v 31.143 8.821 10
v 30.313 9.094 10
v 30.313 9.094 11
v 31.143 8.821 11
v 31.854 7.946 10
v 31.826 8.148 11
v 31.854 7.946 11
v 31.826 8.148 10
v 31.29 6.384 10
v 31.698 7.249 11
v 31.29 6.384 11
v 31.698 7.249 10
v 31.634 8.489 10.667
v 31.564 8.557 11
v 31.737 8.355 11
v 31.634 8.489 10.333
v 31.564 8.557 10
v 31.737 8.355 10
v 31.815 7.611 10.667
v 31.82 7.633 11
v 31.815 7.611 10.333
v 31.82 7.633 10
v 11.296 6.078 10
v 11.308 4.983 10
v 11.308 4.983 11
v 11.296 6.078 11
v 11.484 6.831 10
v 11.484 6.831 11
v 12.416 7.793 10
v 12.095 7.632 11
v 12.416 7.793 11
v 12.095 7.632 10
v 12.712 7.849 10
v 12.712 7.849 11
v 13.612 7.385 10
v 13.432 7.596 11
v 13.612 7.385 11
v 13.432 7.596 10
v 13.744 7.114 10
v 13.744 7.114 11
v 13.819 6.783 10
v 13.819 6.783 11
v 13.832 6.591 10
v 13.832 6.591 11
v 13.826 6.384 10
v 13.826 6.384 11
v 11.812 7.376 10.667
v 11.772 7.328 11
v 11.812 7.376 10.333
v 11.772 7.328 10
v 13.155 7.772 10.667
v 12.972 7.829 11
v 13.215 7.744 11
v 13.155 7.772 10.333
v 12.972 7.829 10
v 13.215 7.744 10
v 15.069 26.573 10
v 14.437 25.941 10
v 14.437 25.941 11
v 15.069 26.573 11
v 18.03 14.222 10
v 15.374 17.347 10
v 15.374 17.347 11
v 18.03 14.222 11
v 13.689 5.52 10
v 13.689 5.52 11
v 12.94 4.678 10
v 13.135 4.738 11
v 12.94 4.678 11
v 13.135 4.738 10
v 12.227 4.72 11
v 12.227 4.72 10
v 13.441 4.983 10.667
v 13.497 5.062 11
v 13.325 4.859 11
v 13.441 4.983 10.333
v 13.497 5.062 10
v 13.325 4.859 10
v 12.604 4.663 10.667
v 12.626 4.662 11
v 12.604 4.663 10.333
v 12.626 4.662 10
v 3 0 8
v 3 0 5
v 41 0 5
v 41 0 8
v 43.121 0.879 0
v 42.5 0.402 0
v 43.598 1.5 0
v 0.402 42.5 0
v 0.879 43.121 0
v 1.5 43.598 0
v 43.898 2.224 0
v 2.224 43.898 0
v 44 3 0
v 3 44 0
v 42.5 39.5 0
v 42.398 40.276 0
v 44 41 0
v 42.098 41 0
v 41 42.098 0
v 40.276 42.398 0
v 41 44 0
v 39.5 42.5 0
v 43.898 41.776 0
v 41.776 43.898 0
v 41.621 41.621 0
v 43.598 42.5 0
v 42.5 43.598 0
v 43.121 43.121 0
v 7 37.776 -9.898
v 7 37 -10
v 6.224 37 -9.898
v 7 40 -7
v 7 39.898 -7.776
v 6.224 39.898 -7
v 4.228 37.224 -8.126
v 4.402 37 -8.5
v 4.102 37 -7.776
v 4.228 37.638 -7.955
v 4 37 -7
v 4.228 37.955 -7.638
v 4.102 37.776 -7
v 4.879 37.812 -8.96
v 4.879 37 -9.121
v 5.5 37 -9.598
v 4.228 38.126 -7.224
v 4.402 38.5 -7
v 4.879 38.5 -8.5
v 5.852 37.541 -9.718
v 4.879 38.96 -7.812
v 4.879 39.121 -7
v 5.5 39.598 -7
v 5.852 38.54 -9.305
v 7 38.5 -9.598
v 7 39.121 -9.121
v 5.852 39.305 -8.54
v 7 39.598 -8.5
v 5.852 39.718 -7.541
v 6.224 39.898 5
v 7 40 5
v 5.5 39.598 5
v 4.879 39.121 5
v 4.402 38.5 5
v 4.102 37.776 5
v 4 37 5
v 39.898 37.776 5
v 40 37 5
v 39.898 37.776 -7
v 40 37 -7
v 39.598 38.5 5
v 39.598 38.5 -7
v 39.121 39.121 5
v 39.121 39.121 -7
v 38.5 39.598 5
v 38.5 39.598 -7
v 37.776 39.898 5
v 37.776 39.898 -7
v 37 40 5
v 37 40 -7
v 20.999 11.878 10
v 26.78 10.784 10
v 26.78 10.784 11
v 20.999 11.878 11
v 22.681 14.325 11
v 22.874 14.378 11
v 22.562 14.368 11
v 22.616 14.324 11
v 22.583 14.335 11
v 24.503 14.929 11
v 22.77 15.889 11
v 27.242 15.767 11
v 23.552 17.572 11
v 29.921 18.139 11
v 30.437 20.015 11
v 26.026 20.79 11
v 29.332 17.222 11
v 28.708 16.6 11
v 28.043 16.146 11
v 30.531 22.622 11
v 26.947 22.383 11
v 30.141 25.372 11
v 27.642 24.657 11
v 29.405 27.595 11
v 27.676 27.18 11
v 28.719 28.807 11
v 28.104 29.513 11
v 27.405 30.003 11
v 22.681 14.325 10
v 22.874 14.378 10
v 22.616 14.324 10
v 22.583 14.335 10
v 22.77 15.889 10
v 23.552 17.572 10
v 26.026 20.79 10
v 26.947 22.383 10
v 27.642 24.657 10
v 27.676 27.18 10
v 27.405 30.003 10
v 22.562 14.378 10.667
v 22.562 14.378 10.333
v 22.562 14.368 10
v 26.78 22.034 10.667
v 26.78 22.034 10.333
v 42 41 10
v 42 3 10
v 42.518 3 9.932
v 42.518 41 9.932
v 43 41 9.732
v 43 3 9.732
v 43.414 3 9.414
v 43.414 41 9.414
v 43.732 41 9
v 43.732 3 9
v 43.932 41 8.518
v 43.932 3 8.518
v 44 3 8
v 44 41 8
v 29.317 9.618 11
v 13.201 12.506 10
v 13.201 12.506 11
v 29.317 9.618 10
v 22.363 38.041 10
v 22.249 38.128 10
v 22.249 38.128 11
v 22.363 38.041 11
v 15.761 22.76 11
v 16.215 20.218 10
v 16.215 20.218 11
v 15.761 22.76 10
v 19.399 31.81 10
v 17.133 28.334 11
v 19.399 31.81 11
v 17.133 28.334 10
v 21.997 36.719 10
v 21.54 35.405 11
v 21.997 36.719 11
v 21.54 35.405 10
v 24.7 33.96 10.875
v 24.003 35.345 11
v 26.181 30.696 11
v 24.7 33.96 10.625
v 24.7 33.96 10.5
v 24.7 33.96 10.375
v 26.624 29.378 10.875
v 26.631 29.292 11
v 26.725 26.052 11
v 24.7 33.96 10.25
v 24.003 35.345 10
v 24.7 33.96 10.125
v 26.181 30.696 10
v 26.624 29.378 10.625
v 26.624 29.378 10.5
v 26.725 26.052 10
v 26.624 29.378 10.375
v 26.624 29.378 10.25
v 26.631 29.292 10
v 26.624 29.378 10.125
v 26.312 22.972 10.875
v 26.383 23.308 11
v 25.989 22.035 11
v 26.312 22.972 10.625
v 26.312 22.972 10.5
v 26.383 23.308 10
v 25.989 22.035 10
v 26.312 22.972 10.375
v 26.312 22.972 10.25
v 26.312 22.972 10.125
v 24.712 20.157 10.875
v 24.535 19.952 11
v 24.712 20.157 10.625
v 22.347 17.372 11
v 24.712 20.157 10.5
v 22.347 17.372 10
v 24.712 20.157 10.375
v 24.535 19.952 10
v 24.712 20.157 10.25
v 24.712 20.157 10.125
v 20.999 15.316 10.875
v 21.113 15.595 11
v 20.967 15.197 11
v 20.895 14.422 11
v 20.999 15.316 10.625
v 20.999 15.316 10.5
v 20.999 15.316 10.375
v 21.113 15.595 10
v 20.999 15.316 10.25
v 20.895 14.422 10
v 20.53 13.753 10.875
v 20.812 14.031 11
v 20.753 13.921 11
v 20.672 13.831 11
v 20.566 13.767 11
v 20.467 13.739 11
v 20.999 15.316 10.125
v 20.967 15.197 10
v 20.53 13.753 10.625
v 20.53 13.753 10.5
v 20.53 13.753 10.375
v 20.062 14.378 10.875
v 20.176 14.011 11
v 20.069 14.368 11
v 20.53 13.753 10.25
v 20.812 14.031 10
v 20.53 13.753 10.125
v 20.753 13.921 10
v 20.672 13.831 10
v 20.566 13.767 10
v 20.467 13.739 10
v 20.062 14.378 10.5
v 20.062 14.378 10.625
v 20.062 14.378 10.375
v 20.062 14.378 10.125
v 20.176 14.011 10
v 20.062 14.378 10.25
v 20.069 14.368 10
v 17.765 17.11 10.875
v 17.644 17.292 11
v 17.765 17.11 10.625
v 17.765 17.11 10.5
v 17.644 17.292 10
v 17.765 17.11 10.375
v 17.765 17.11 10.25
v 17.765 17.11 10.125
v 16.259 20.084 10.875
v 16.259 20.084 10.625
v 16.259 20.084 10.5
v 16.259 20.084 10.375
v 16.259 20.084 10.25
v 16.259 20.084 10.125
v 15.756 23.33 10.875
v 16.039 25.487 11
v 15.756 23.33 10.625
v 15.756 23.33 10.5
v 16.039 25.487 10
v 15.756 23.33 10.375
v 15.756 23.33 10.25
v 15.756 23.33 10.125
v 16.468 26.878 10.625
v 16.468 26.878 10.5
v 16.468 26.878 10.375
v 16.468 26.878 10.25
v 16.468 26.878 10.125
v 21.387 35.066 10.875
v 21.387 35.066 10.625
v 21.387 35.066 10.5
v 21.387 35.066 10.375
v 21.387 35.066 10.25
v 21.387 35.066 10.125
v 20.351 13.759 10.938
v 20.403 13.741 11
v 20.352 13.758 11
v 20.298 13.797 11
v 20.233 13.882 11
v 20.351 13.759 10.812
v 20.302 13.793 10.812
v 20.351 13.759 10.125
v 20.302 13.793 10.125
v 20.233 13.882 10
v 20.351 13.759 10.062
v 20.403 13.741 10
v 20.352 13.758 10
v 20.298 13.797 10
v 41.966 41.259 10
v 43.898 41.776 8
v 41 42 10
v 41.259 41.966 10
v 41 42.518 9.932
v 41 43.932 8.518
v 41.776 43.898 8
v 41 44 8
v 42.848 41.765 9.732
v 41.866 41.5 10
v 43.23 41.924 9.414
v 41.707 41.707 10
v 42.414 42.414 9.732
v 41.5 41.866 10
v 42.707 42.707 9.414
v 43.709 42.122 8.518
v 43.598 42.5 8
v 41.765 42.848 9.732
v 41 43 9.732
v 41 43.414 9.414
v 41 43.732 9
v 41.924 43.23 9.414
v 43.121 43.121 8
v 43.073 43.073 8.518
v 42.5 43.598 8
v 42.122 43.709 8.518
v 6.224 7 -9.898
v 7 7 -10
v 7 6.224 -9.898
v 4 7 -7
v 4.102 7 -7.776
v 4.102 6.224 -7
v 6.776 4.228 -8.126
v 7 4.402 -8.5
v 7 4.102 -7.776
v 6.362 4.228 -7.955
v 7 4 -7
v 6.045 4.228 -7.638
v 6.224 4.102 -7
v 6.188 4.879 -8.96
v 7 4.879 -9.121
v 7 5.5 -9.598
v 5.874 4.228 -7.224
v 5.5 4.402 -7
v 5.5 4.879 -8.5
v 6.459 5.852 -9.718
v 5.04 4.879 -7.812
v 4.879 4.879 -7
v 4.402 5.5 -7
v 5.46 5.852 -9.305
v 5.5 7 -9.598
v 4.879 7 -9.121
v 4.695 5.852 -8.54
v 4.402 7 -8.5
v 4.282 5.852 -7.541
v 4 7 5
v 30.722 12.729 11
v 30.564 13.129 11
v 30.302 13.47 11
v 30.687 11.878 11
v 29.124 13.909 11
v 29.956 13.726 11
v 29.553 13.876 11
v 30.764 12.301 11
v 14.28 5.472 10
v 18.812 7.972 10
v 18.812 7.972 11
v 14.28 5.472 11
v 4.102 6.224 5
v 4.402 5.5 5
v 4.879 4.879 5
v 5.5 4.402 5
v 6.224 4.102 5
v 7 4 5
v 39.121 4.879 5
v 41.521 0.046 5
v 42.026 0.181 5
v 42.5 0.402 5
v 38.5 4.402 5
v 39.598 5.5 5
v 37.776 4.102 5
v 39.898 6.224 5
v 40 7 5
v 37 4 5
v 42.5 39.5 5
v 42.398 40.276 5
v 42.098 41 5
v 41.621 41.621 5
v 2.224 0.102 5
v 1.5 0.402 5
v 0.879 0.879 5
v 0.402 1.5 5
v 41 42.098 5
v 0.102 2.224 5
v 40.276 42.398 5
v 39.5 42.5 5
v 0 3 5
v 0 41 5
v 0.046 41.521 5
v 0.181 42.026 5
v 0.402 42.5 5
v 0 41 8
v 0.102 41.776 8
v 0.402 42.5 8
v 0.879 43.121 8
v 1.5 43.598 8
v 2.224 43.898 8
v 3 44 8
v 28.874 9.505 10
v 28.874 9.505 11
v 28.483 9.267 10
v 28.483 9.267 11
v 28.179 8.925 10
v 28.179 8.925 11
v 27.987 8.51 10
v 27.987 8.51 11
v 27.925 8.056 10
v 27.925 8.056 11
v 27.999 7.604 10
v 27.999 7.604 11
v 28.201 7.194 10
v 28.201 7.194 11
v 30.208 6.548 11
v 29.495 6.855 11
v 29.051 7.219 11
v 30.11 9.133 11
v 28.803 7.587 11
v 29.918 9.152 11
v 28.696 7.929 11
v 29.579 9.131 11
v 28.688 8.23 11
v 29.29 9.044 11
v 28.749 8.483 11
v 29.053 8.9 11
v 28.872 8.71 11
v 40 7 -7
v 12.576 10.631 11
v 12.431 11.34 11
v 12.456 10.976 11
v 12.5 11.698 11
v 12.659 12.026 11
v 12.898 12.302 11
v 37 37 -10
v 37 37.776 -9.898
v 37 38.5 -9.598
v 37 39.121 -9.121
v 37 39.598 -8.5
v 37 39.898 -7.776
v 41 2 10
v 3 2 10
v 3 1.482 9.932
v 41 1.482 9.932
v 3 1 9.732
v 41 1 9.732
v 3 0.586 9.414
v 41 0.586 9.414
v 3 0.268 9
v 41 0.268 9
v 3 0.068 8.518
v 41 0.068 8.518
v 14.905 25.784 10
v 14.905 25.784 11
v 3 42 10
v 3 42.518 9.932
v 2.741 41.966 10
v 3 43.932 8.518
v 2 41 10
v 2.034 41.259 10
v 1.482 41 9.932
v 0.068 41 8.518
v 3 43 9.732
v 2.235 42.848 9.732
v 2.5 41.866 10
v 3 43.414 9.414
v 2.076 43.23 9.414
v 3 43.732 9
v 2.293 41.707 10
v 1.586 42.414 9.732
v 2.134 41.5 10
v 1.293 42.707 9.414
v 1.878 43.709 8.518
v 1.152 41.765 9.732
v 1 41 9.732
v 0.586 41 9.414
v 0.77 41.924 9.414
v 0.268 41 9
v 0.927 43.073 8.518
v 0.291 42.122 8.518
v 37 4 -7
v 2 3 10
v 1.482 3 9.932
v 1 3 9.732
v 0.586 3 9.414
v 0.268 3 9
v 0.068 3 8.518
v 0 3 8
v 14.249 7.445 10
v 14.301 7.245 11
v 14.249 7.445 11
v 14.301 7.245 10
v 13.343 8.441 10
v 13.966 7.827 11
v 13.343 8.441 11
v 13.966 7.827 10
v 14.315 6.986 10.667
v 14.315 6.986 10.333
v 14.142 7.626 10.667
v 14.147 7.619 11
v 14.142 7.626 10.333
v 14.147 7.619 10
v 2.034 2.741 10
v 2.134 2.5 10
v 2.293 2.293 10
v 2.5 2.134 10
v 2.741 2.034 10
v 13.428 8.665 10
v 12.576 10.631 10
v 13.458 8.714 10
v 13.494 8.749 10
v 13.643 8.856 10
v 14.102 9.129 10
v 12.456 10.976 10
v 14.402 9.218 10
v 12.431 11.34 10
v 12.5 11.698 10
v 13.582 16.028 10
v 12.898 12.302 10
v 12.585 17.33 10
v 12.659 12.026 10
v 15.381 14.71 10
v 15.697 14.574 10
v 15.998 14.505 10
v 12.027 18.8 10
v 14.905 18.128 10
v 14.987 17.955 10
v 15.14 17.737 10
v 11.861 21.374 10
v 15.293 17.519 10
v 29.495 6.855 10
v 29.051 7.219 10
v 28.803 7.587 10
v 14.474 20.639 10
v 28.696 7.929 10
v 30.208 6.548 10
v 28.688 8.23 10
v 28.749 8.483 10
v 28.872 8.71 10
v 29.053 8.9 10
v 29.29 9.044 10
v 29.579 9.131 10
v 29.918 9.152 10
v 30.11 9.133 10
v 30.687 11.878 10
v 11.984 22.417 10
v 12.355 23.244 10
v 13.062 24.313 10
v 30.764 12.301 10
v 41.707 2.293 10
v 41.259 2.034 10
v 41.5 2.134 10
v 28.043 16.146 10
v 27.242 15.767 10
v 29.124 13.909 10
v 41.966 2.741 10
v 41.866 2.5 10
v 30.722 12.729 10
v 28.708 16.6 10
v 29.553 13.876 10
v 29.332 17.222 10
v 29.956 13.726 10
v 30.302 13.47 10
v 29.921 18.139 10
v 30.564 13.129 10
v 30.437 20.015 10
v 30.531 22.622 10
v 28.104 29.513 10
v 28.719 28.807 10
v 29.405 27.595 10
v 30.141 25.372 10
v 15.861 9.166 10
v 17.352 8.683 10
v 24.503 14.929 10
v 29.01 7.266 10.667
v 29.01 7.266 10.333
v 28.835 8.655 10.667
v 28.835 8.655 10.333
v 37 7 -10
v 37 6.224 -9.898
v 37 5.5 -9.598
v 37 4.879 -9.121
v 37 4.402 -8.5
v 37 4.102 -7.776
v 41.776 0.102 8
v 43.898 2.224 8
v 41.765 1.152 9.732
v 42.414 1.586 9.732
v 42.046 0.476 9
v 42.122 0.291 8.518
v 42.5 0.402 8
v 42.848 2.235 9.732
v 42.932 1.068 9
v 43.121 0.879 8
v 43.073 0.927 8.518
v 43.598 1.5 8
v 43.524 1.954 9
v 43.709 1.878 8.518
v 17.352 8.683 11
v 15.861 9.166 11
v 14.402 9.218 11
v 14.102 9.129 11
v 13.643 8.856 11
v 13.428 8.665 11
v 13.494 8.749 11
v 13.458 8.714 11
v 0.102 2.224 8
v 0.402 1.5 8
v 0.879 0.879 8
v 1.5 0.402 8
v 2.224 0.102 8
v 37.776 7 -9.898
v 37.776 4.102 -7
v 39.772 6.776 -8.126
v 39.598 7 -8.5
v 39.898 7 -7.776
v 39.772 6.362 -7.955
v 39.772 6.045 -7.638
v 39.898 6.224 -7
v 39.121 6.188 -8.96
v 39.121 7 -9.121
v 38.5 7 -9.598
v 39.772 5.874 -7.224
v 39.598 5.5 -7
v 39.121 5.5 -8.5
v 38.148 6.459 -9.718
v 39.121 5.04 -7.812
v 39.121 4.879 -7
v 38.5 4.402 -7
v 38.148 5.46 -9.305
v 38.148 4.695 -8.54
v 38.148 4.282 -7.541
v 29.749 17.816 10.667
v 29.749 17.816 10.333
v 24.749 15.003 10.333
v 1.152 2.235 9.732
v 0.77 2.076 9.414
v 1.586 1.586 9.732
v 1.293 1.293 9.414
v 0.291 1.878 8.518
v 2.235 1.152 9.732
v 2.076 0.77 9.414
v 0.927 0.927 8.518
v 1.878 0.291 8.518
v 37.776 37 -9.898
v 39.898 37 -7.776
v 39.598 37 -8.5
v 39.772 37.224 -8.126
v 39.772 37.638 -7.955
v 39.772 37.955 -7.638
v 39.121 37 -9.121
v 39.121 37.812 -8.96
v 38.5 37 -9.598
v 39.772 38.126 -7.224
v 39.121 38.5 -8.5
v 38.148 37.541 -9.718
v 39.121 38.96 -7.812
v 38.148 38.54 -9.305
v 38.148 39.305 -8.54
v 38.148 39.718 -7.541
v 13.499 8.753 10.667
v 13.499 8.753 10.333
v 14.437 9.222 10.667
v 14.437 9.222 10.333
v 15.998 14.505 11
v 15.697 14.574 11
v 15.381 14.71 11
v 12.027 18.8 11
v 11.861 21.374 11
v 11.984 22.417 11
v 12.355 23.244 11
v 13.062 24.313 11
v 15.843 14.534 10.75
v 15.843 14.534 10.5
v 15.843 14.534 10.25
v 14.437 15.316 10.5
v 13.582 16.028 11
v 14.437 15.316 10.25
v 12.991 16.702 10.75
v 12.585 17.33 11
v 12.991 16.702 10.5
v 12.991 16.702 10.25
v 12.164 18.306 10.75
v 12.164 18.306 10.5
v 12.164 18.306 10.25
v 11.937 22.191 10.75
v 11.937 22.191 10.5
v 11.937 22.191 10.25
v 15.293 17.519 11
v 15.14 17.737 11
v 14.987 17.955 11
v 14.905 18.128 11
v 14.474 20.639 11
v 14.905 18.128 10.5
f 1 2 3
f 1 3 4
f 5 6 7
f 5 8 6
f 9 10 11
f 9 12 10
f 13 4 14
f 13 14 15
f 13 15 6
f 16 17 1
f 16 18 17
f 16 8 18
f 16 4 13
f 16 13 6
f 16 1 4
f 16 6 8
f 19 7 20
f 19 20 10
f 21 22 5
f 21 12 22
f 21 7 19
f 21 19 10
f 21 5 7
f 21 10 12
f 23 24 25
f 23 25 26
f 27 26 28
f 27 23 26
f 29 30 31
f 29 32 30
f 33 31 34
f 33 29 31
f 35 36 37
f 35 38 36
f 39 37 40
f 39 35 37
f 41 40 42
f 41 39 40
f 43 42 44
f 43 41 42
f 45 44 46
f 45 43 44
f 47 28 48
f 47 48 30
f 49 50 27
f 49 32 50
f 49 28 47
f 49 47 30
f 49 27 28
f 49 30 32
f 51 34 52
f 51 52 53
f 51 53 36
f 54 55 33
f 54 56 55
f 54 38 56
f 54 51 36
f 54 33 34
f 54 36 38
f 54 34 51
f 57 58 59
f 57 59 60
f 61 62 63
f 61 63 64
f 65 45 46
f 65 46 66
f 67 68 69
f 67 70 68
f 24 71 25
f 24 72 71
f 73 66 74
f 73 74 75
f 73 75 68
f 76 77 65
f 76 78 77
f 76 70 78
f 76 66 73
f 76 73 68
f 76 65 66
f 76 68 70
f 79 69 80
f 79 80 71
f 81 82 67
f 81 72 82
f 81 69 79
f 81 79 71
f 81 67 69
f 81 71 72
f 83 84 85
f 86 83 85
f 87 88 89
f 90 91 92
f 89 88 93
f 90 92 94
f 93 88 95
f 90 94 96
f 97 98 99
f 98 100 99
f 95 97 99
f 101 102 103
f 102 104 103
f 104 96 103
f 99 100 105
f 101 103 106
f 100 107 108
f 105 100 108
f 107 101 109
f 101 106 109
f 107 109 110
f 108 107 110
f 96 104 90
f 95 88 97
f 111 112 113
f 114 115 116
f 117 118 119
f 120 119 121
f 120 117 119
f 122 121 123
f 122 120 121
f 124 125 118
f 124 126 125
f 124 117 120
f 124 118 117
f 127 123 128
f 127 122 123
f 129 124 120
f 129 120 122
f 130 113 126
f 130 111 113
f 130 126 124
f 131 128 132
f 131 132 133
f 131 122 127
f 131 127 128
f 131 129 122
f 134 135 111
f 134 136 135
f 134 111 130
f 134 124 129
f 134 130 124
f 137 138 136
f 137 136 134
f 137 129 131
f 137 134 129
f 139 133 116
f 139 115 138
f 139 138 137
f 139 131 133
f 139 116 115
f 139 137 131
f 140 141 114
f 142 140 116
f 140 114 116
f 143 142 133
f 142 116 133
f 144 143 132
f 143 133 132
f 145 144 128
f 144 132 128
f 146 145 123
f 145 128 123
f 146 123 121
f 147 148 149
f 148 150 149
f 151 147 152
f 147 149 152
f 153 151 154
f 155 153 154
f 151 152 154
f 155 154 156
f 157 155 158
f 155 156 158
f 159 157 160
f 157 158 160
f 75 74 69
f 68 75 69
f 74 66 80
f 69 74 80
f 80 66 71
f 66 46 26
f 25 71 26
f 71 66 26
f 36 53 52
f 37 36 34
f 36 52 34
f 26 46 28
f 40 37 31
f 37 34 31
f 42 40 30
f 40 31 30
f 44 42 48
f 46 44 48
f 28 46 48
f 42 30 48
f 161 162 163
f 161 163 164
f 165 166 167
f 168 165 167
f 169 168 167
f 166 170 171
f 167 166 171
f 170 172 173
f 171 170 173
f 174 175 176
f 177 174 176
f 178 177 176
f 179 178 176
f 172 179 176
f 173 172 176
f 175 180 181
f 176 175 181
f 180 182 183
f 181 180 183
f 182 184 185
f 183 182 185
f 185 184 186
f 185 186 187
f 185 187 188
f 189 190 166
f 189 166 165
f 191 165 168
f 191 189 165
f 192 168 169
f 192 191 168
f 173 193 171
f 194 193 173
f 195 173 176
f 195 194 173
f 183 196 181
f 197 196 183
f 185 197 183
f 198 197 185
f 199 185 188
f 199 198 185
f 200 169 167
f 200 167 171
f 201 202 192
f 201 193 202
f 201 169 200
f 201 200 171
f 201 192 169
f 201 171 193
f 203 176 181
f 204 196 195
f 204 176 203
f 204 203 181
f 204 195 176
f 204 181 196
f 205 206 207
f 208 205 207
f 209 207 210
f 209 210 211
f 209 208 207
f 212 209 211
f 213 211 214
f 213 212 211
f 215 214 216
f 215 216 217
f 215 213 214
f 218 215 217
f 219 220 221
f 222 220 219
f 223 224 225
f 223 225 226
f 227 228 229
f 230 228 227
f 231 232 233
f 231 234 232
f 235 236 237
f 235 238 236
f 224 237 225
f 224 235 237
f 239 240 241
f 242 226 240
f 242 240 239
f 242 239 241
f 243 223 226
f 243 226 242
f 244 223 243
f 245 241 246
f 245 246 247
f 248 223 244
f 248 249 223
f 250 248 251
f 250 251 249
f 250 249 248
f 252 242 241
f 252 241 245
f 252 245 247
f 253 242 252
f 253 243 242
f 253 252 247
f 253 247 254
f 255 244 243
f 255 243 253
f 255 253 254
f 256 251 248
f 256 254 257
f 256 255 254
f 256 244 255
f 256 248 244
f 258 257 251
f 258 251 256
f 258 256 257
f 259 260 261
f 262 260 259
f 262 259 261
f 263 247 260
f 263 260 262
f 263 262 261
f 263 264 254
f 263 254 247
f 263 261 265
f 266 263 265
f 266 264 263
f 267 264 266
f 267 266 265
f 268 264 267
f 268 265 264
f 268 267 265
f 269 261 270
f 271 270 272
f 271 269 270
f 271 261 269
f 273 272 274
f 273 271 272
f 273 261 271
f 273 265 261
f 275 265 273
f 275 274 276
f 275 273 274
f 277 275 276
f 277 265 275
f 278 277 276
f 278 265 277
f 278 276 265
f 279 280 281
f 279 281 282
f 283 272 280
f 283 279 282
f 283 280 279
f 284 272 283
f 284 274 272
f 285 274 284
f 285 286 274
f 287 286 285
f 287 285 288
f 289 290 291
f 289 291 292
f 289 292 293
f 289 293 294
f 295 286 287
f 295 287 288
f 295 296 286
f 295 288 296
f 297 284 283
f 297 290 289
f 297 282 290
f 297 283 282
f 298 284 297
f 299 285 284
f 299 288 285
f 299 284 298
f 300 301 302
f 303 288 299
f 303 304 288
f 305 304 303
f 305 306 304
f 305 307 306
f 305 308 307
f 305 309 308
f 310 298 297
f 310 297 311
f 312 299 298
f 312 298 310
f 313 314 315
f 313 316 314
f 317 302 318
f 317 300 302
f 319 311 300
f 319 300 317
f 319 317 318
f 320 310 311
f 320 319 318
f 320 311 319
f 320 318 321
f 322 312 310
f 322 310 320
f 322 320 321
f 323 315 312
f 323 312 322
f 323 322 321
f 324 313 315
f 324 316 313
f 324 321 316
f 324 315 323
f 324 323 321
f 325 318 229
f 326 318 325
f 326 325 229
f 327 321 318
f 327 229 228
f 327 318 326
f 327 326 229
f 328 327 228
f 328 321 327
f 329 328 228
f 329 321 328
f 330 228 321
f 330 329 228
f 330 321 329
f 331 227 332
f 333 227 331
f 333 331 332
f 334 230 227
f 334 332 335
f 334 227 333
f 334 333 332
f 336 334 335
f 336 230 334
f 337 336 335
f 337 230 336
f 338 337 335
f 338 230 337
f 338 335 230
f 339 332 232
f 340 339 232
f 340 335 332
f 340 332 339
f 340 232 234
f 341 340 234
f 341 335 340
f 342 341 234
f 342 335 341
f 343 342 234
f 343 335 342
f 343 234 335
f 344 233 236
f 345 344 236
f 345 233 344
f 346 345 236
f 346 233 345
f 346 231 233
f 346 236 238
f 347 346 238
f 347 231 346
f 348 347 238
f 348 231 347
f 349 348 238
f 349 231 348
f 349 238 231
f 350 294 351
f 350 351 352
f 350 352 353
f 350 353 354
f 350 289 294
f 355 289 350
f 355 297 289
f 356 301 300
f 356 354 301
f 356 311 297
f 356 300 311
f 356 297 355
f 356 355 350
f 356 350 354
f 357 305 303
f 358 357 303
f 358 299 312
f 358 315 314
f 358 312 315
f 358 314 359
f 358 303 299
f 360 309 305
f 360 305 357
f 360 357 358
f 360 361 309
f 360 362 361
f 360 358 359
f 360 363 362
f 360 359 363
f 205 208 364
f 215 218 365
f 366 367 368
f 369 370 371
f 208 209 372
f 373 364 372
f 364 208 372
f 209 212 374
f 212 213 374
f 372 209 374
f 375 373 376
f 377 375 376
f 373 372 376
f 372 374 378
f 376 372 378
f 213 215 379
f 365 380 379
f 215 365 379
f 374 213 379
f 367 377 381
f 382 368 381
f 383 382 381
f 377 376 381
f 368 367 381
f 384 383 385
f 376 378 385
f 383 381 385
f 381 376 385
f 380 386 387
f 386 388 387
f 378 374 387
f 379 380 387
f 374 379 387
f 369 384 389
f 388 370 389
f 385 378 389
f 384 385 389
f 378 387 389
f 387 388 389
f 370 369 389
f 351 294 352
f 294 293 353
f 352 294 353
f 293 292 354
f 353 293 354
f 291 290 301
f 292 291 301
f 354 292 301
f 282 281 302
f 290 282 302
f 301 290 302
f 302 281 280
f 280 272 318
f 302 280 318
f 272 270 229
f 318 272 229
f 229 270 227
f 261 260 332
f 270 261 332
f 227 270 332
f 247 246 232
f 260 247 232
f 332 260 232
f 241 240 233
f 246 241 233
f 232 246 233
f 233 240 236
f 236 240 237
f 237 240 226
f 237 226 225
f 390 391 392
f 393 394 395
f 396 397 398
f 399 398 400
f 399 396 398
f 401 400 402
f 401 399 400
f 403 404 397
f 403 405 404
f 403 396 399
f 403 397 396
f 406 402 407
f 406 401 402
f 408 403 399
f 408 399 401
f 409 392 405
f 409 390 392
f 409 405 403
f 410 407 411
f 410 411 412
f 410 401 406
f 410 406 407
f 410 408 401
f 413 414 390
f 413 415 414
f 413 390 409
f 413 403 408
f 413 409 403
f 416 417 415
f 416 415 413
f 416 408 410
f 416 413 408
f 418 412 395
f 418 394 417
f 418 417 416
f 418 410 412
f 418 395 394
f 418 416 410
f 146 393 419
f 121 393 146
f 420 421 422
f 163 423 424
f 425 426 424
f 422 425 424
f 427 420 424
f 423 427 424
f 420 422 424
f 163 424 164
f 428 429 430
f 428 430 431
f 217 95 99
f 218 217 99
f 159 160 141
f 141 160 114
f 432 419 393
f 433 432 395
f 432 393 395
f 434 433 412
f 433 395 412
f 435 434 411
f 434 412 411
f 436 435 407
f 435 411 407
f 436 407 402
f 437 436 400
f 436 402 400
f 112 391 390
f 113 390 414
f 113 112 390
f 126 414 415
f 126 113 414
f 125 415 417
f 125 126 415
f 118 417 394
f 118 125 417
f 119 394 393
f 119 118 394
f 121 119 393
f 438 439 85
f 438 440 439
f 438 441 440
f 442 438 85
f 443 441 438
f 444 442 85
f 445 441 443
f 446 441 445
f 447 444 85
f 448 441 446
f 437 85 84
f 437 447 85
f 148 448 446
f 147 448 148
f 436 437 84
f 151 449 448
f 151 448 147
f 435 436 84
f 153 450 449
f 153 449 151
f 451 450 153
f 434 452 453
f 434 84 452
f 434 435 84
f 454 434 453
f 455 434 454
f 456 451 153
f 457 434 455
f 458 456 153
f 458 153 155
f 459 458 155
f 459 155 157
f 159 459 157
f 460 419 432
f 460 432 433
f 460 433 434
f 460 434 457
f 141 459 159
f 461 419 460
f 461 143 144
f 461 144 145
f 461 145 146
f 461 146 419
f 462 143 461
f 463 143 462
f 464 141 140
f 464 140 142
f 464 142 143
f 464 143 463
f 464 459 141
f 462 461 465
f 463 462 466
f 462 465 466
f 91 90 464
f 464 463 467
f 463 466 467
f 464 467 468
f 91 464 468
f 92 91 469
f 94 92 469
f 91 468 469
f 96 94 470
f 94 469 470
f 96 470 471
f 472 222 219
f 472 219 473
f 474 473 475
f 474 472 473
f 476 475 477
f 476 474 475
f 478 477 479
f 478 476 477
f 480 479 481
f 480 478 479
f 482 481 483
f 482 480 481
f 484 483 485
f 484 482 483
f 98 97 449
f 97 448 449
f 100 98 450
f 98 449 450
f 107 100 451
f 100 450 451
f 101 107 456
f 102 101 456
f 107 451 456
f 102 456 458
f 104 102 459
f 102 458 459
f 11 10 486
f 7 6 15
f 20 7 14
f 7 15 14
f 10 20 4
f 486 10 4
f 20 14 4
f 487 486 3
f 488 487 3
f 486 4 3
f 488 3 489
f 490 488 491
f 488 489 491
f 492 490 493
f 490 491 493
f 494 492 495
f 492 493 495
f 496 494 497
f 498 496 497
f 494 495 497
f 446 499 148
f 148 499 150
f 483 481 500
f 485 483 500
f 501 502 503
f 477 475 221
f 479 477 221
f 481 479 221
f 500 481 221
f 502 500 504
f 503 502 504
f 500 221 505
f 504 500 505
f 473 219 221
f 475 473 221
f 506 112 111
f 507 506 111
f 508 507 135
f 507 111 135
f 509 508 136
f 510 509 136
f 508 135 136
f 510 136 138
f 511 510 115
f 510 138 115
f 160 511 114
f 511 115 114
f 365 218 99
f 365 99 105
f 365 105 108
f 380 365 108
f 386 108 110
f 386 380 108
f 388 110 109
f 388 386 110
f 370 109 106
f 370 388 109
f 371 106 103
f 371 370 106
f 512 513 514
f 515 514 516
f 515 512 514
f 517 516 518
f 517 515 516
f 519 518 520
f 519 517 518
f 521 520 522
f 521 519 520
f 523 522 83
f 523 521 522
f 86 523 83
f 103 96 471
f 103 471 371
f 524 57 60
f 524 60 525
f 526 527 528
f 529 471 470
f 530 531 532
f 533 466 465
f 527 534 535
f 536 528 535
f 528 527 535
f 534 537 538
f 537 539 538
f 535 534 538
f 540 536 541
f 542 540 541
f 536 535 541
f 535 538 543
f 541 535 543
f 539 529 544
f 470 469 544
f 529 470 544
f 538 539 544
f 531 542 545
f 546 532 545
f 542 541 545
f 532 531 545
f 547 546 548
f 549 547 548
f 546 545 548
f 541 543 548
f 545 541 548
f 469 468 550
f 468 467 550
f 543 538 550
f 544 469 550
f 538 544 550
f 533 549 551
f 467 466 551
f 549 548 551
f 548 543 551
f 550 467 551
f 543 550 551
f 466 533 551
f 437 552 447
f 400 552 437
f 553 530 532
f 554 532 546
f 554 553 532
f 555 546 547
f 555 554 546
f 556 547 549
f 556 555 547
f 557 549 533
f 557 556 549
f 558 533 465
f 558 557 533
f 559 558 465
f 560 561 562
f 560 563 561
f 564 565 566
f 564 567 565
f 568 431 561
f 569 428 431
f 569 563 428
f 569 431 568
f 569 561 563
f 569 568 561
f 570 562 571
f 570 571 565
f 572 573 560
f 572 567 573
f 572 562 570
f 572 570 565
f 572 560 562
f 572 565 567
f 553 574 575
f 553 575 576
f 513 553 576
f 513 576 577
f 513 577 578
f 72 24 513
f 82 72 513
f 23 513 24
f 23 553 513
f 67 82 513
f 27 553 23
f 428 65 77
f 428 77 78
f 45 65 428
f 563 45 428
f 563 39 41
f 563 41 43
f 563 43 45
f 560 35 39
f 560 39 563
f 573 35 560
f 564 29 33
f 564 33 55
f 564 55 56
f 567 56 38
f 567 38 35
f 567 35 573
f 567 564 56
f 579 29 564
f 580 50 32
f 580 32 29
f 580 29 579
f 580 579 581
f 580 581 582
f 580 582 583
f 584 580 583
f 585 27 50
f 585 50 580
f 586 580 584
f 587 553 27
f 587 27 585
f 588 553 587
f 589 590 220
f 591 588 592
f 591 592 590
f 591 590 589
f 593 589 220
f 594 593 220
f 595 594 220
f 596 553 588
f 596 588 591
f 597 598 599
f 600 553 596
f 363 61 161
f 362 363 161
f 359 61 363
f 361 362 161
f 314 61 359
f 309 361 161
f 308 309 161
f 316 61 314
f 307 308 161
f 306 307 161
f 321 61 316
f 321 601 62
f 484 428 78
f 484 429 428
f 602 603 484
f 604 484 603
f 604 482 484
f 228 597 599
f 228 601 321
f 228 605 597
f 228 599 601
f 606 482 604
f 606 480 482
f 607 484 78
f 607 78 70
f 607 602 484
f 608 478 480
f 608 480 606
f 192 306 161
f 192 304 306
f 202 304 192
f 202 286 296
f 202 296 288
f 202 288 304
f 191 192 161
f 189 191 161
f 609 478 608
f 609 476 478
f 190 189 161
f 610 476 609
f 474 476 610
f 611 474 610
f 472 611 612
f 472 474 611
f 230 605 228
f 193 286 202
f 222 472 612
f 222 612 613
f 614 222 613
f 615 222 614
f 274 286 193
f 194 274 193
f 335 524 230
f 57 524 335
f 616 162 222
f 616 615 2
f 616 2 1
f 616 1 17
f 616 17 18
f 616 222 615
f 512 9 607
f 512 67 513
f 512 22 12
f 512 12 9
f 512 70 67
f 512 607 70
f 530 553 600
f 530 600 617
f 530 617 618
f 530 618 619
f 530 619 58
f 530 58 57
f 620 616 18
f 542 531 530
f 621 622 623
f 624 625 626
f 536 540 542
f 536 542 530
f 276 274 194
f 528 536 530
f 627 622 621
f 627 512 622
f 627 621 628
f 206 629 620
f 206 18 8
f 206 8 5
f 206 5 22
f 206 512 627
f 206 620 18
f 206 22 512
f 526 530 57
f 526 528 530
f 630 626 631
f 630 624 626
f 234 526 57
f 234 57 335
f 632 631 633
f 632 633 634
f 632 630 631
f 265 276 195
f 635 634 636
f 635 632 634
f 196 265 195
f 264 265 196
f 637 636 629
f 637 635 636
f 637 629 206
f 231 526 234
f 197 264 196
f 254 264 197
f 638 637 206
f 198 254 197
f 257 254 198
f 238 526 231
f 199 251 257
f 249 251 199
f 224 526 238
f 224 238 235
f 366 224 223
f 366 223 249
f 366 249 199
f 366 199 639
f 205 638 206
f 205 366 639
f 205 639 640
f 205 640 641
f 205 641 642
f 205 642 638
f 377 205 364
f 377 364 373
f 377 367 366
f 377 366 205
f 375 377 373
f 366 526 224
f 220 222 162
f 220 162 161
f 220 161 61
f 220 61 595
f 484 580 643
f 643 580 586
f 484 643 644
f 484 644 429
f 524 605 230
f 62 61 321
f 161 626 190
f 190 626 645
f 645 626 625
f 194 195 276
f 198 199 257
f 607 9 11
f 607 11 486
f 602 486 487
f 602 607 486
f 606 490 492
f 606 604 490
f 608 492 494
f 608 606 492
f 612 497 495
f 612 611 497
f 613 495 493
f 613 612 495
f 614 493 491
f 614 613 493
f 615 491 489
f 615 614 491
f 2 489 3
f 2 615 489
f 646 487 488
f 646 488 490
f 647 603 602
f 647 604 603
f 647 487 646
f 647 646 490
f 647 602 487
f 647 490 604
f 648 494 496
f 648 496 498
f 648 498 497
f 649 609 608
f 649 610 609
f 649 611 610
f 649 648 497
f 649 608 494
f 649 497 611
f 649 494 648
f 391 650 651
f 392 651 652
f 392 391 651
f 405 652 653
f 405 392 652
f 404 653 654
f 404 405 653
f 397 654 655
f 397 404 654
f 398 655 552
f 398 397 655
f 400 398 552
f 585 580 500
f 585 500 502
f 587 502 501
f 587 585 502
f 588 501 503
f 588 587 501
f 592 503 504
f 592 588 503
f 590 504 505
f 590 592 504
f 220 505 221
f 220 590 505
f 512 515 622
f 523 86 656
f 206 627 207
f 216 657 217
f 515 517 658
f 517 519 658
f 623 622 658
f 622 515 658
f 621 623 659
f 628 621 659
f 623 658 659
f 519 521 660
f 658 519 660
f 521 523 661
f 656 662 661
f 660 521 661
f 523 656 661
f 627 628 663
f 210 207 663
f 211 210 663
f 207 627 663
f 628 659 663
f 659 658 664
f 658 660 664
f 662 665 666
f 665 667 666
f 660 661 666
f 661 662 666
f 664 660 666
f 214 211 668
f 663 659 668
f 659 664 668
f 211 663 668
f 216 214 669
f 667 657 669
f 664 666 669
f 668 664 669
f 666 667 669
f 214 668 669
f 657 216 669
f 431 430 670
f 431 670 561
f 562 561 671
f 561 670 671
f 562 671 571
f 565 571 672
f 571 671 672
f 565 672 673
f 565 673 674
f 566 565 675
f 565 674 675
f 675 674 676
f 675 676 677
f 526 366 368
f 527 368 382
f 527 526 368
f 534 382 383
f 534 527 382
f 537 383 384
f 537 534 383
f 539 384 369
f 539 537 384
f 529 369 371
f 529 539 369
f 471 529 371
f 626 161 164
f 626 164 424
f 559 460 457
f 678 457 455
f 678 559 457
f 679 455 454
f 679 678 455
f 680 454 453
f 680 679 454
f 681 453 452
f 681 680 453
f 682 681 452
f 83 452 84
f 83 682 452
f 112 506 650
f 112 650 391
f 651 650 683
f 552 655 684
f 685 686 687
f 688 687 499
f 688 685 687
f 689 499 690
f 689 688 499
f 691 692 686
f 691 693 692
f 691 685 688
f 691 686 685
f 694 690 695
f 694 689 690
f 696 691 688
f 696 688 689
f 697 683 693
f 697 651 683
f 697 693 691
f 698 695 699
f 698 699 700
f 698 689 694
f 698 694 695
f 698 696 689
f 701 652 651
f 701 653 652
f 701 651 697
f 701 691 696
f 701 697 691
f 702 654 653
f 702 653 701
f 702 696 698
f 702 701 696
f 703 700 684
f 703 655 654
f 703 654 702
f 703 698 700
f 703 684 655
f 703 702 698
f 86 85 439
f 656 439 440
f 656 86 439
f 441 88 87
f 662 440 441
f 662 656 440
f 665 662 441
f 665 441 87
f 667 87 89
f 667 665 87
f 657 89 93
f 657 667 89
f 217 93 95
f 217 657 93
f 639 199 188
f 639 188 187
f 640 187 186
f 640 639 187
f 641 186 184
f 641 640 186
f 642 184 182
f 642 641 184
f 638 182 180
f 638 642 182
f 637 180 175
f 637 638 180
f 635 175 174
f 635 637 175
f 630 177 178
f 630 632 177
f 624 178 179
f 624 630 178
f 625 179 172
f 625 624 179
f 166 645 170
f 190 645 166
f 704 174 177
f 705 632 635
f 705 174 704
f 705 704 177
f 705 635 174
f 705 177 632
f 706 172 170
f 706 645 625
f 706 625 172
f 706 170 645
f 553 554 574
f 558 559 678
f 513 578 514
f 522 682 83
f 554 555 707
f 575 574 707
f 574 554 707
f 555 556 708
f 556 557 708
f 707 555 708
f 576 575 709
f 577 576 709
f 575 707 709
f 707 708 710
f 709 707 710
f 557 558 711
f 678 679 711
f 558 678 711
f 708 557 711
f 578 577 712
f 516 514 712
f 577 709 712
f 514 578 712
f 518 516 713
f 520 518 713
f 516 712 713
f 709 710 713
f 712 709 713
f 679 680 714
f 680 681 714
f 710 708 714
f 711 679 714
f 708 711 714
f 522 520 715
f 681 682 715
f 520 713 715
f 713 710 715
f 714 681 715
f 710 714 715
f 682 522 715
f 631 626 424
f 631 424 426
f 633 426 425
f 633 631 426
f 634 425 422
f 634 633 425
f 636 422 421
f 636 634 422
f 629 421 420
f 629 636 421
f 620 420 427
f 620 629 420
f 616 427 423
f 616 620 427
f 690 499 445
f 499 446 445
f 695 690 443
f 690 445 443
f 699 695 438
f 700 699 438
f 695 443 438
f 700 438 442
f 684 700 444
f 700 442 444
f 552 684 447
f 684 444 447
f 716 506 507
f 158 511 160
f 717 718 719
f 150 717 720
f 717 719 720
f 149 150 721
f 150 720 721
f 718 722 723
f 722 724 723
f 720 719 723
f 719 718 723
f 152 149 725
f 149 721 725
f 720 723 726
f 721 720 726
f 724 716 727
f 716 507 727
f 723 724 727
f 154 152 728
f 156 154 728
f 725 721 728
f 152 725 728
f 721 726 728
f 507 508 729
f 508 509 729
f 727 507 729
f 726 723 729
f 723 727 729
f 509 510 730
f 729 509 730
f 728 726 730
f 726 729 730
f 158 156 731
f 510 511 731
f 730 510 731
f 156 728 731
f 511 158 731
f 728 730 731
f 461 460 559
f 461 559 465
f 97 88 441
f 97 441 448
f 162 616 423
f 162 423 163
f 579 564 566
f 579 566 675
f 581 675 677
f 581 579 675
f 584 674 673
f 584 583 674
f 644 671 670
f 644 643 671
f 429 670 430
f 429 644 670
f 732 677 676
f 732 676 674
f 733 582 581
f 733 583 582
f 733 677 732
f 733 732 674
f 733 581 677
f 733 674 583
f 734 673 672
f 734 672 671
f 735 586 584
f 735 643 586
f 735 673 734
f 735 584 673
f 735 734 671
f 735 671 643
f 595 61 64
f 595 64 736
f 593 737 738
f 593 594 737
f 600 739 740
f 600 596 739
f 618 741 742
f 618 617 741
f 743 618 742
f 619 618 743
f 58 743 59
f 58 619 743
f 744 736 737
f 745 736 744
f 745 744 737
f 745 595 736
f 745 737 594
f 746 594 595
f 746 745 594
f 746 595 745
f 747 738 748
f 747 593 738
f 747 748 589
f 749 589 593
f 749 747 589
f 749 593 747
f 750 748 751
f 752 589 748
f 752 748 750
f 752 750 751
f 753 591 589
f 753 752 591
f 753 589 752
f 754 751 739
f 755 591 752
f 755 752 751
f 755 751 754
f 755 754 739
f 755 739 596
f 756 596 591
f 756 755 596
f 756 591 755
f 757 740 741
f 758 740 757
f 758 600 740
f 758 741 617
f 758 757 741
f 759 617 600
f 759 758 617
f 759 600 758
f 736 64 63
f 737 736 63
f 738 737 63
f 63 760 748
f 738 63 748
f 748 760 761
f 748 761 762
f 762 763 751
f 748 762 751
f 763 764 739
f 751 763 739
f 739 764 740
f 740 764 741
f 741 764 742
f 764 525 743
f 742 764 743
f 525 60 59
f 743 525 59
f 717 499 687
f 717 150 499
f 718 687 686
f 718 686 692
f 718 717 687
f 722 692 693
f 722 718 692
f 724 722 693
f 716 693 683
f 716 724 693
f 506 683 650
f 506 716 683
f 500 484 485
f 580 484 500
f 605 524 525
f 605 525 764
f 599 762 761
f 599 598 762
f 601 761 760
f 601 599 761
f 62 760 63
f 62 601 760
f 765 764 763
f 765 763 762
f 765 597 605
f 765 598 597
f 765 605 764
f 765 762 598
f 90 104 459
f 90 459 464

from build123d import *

# Parameters (mm, degrees)
ESQUISSE2_W             = 44
ESQUISSE2_H             = 44
BOSS_EXTRU_1_DEPTH      = 10
ESQUISSE3_W             = 36
ESQUISSE3_H             = 36
BOSS_EXTRU_2_DEPTH      = 10
ESQUISSE4_W             = 42.5
ESQUISSE4_H             = 42.5
ESQUISSE4_W_2           = 36
ESQUISSE4_H_2           = 36
ENL_V_MAT_EXTRU_1_DEPTH = 5
CONG_1_R                = 3
CONG_2_R                = 2
BOSS_EXTRU_4_DEPTH      = 1


with BuildPart() as part:
    # Esquisse2 → Boss.-Extru.1 (new body)
    with BuildSketch(Plane.XY):
        with Locations((22, 22)):
            Rectangle(ESQUISSE2_W, ESQUISSE2_H)
    extrude(amount=BOSS_EXTRU_1_DEPTH)

    # Esquisse3 → Boss.-Extru.2 (add)
    with BuildSketch(Plane(origin=(0, 0, 0), x_dir=(-1, 0, 0), z_dir=(0, 0, -1))):
        with Locations((-22, 22)):
            Rectangle(ESQUISSE3_W, ESQUISSE3_H)
    extrude(amount=BOSS_EXTRU_2_DEPTH)

    # Esquisse4 → Enlèv. mat.-Extru.1 (cut)
    with BuildSketch(Plane(origin=(0, 0, 0), x_dir=(-1, 0, 0), z_dir=(0, 0, -1))):
        with Locations((-21.25, 21.25)):
            Rectangle(ESQUISSE4_W, ESQUISSE4_H)
        with Locations((-22, 22)):
            Rectangle(ESQUISSE4_W_2, ESQUISSE4_H_2, mode=Mode.SUBTRACT)
    extrude(amount=-ENL_V_MAT_EXTRU_1_DEPTH, mode=Mode.SUBTRACT)

    # Congé1
    cong_1_edges = [part.edges().sort_by_distance(p)[0] for p in [
        (22, 40, -10),
        (4, 22, -10),
        (22, 4, -10),
        (40, 22, -10),
        (44, 0, 5),
        (44, 44, 5),
        (0, 0, 7.5),
        (0, 44, 5),
        (4, 4, -2.5),
        (4, 40, -2.5),
        (40, 4, -2.5),
        (40, 40, -2.5),
        (42.5, 42.5, 2.5),
    ]]
    fillet(cong_1_edges, radius=CONG_1_R)

    # Congé2
    cong_2_edges = [part.edges().sort_by_distance(p)[0] for p in [
        (44, 22, 10),
        (22, 0, 10),
        (0, 22, 10),
        (22, 44, 10),
        (0.878679656, 43.121320344, 10),
        (0.878679656, 0.878679656, 10),
        (43.121320344, 43.121320344, 10),
        (43.121320344, 0.878679656, 10),
    ]]
    fillet(cong_2_edges, radius=CONG_2_R)

    # Esquisse7 → Boss.-Extru.4 (add)
    with BuildSketch(Plane.XY.offset(10)):
        with BuildLine():
            Line((15.374098957, 17.346843443), (18.030348957, 14.221843443))
            add(Edge.make_bspline(
                [(18.030348957, 14.221843443), (17.301182291, 14.32601011), (16.565114838, 14.389890267), (15.842848957, 14.534343443), (15.423010802, 14.618311074), (14.838115665, 15.028795794), (14.436598957, 15.315593443), (12.049681404, 17.020534553), (11.595795075, 19.293760446), (11.936598957, 22.190593443), (12.054157826, 23.189843826), (13.69238751, 25.196381996), (14.436598957, 25.940593443)],
                knots=[0, 0, 0, 0, 1, 1, 1, 2, 2, 2, 3, 3, 3, 4, 4, 4, 4], degree=3))
            Line((14.436598957, 25.940593443), (15.06939707, 26.573391556))
            Line((15.06939707, 26.573391556), (14.905348957, 25.784343443))
            add(Edge.make_bspline(
                [(14.905348957, 25.784343443), (14.590446041, 23.265120116), (14.091309116, 20.570212966), (14.905348957, 18.128093443), (15.001385879, 17.839982679), (15.278062036, 17.634954207), (15.374098957, 17.346843443)],
                knots=[0, 0, 0, 0, 1, 1, 1, 2, 2, 2, 2], degree=3))
        make_face()
        with BuildLine():
            Line((30.686598957, 11.878093443), (26.780348957, 10.784343443))
            Line((26.780348957, 10.784343443), (20.999098957, 11.878093443))
            Line((20.999098957, 11.878093443), (29.124098957, 13.909343443))
            ThreePointArc((29.124098957, 13.909343443), (30.444920086, 13.308773157), (30.686598957, 11.878093443))
        make_face()
        with BuildLine():
            Line((18.811598957, 7.971843443), (14.280348957, 5.471843443))
            add(Edge.make_bspline(
                [(14.280348957, 5.471843443), (14.280348957, 7.772797666), (14.593726557, 7.189715843), (13.342848957, 8.440593443)],
                knots=[0, 0, 0, 0, 1, 1, 1, 1], degree=3))
            add(Edge.make_bspline(
                [(13.342848957, 8.440593443), (13.394932291, 8.54476011), (13.404330032, 8.685401354), (13.499098957, 8.753093443), (13.783405732, 8.956169711), (14.089133052, 9.185268084), (14.436598957, 9.221843443), (16.134694919, 9.400590386), (17.384797269, 8.685244287), (18.811598957, 7.971843443)],
                knots=[0, 0, 0, 0, 1, 1, 1, 2, 2, 2, 3, 3, 3, 3], degree=3))
        make_face()
        with BuildLine():
            Line((13.200641117, 12.506283222), (29.317230938, 9.618393711))
            ThreePointArc((29.317230938, 9.618393711), (28.067553161, 8.724486443), (28.200641117, 7.193783222))
            Line((28.200641117, 7.193783222), (12.575641117, 10.631283222))
            ThreePointArc((12.575641117, 10.631283222), (12.499815902, 11.698224961), (13.200641117, 12.506283222))
        make_face()
        with BuildLine():
            add(Edge.make_bspline(
                [(20.999098957, 15.315593443), (20.827145061, 14.799731755), (21.046210645, 13.925047339), (20.530348957, 13.753093443), (20.153128088, 13.627353153), (20.137873233, 14.301819167), (20.061598957, 14.378093443), (16.567694762, 17.871997638), (14.613515541, 21.933204334), (16.467848957, 26.878093443), (17.971713728, 30.888399498), (21.846423142, 33.698659479), (22.249098957, 38.128093443)],
                knots=[4, 4, 4, 4, 5, 5, 5, 6, 6, 6, 7, 7, 7, 8, 8, 8, 8], degree=3))
            add(Edge.make_bspline(
                [(22.249098957, 38.128093443), (23.024720103, 37.74028287), (26.549972992, 30.317022339), (26.624098957, 29.378093443), (26.824723104, 26.836854256), (26.793735434, 25.141457588), (26.311598957, 22.971843443), (25.843661476, 20.866124777), (23.763276375, 19.341691827), (22.561598957, 17.659343443), (22.093633816, 17.004192245), (21.257183639, 16.089847489), (20.999098957, 15.315593443)],
                knots=[0, 0, 0, 0, 1, 1, 1, 2, 2, 2, 3, 3, 3, 4, 4, 4, 4], degree=3))
        make_face()
        with BuildLine():
            add(Edge.make_bspline(
                [(22.874098957, 14.378093443), (22.776875457, 14.340699789), (22.561598957, 14.273926776), (22.561598957, 14.378093443), (22.561598957, 17.724570677), (25.385181625, 19.244008778), (26.780348957, 22.034343443), (28.269529967, 25.012705463), (27.627114524, 26.898375507), (27.405348957, 30.003093443)],
                knots=[3, 3, 3, 3, 4, 4, 4, 5, 5, 5, 6, 6, 6, 6], degree=3))
            add(Edge.make_bspline(
                [(27.405348957, 30.003093443), (30.439237099, 28.486149372), (31.410808057, 20.585108609), (29.749098957, 17.815593443), (28.578255605, 15.864187855), (26.718288261, 15.58655694), (24.749098957, 15.003093443), (24.117435238, 14.815933822), (23.488994366, 14.614591677), (22.874098957, 14.378093443)],
                knots=[0, 0, 0, 0, 1, 1, 1, 2, 2, 2, 3, 3, 3, 3], degree=3))
        make_face()
        with BuildLine():
            add(Edge.make_bspline(
                [(13.825641117, 6.383595142), (13.664946359, 4.294397314), (12.835062605, 4.491118619), (11.307669526, 4.983380758)],
                knots=[1, 1, 1, 1, 2, 2, 2, 2], degree=3))
            add(Edge.make_bspline(
                [(11.307669526, 4.983380758), (10.888236852, 8.443524348), (13.995704046, 8.594588879), (13.825641117, 6.383595142)],
                knots=[0, 0, 0, 0, 1, 1, 1, 1], degree=3))
        make_face()
        with BuildLine():
            add(Edge.make_bspline(
                [(30.312986898, 9.093826211), (32.34922339, 8.599547626), (32.02172038, 7.812052803), (31.290447284, 6.383595142)],
                knots=[1, 1, 1, 1, 2, 2, 2, 2], degree=3))
            add(Edge.make_bspline(
                [(31.290447284, 6.383595142), (27.807867011, 6.525553152), (28.158042034, 9.616920214), (30.312986898, 9.093826211)],
                knots=[0, 0, 0, 0, 1, 1, 1, 1], degree=3))
        make_face()
    extrude(amount=BOSS_EXTRU_4_DEPTH)


solid = part.part
